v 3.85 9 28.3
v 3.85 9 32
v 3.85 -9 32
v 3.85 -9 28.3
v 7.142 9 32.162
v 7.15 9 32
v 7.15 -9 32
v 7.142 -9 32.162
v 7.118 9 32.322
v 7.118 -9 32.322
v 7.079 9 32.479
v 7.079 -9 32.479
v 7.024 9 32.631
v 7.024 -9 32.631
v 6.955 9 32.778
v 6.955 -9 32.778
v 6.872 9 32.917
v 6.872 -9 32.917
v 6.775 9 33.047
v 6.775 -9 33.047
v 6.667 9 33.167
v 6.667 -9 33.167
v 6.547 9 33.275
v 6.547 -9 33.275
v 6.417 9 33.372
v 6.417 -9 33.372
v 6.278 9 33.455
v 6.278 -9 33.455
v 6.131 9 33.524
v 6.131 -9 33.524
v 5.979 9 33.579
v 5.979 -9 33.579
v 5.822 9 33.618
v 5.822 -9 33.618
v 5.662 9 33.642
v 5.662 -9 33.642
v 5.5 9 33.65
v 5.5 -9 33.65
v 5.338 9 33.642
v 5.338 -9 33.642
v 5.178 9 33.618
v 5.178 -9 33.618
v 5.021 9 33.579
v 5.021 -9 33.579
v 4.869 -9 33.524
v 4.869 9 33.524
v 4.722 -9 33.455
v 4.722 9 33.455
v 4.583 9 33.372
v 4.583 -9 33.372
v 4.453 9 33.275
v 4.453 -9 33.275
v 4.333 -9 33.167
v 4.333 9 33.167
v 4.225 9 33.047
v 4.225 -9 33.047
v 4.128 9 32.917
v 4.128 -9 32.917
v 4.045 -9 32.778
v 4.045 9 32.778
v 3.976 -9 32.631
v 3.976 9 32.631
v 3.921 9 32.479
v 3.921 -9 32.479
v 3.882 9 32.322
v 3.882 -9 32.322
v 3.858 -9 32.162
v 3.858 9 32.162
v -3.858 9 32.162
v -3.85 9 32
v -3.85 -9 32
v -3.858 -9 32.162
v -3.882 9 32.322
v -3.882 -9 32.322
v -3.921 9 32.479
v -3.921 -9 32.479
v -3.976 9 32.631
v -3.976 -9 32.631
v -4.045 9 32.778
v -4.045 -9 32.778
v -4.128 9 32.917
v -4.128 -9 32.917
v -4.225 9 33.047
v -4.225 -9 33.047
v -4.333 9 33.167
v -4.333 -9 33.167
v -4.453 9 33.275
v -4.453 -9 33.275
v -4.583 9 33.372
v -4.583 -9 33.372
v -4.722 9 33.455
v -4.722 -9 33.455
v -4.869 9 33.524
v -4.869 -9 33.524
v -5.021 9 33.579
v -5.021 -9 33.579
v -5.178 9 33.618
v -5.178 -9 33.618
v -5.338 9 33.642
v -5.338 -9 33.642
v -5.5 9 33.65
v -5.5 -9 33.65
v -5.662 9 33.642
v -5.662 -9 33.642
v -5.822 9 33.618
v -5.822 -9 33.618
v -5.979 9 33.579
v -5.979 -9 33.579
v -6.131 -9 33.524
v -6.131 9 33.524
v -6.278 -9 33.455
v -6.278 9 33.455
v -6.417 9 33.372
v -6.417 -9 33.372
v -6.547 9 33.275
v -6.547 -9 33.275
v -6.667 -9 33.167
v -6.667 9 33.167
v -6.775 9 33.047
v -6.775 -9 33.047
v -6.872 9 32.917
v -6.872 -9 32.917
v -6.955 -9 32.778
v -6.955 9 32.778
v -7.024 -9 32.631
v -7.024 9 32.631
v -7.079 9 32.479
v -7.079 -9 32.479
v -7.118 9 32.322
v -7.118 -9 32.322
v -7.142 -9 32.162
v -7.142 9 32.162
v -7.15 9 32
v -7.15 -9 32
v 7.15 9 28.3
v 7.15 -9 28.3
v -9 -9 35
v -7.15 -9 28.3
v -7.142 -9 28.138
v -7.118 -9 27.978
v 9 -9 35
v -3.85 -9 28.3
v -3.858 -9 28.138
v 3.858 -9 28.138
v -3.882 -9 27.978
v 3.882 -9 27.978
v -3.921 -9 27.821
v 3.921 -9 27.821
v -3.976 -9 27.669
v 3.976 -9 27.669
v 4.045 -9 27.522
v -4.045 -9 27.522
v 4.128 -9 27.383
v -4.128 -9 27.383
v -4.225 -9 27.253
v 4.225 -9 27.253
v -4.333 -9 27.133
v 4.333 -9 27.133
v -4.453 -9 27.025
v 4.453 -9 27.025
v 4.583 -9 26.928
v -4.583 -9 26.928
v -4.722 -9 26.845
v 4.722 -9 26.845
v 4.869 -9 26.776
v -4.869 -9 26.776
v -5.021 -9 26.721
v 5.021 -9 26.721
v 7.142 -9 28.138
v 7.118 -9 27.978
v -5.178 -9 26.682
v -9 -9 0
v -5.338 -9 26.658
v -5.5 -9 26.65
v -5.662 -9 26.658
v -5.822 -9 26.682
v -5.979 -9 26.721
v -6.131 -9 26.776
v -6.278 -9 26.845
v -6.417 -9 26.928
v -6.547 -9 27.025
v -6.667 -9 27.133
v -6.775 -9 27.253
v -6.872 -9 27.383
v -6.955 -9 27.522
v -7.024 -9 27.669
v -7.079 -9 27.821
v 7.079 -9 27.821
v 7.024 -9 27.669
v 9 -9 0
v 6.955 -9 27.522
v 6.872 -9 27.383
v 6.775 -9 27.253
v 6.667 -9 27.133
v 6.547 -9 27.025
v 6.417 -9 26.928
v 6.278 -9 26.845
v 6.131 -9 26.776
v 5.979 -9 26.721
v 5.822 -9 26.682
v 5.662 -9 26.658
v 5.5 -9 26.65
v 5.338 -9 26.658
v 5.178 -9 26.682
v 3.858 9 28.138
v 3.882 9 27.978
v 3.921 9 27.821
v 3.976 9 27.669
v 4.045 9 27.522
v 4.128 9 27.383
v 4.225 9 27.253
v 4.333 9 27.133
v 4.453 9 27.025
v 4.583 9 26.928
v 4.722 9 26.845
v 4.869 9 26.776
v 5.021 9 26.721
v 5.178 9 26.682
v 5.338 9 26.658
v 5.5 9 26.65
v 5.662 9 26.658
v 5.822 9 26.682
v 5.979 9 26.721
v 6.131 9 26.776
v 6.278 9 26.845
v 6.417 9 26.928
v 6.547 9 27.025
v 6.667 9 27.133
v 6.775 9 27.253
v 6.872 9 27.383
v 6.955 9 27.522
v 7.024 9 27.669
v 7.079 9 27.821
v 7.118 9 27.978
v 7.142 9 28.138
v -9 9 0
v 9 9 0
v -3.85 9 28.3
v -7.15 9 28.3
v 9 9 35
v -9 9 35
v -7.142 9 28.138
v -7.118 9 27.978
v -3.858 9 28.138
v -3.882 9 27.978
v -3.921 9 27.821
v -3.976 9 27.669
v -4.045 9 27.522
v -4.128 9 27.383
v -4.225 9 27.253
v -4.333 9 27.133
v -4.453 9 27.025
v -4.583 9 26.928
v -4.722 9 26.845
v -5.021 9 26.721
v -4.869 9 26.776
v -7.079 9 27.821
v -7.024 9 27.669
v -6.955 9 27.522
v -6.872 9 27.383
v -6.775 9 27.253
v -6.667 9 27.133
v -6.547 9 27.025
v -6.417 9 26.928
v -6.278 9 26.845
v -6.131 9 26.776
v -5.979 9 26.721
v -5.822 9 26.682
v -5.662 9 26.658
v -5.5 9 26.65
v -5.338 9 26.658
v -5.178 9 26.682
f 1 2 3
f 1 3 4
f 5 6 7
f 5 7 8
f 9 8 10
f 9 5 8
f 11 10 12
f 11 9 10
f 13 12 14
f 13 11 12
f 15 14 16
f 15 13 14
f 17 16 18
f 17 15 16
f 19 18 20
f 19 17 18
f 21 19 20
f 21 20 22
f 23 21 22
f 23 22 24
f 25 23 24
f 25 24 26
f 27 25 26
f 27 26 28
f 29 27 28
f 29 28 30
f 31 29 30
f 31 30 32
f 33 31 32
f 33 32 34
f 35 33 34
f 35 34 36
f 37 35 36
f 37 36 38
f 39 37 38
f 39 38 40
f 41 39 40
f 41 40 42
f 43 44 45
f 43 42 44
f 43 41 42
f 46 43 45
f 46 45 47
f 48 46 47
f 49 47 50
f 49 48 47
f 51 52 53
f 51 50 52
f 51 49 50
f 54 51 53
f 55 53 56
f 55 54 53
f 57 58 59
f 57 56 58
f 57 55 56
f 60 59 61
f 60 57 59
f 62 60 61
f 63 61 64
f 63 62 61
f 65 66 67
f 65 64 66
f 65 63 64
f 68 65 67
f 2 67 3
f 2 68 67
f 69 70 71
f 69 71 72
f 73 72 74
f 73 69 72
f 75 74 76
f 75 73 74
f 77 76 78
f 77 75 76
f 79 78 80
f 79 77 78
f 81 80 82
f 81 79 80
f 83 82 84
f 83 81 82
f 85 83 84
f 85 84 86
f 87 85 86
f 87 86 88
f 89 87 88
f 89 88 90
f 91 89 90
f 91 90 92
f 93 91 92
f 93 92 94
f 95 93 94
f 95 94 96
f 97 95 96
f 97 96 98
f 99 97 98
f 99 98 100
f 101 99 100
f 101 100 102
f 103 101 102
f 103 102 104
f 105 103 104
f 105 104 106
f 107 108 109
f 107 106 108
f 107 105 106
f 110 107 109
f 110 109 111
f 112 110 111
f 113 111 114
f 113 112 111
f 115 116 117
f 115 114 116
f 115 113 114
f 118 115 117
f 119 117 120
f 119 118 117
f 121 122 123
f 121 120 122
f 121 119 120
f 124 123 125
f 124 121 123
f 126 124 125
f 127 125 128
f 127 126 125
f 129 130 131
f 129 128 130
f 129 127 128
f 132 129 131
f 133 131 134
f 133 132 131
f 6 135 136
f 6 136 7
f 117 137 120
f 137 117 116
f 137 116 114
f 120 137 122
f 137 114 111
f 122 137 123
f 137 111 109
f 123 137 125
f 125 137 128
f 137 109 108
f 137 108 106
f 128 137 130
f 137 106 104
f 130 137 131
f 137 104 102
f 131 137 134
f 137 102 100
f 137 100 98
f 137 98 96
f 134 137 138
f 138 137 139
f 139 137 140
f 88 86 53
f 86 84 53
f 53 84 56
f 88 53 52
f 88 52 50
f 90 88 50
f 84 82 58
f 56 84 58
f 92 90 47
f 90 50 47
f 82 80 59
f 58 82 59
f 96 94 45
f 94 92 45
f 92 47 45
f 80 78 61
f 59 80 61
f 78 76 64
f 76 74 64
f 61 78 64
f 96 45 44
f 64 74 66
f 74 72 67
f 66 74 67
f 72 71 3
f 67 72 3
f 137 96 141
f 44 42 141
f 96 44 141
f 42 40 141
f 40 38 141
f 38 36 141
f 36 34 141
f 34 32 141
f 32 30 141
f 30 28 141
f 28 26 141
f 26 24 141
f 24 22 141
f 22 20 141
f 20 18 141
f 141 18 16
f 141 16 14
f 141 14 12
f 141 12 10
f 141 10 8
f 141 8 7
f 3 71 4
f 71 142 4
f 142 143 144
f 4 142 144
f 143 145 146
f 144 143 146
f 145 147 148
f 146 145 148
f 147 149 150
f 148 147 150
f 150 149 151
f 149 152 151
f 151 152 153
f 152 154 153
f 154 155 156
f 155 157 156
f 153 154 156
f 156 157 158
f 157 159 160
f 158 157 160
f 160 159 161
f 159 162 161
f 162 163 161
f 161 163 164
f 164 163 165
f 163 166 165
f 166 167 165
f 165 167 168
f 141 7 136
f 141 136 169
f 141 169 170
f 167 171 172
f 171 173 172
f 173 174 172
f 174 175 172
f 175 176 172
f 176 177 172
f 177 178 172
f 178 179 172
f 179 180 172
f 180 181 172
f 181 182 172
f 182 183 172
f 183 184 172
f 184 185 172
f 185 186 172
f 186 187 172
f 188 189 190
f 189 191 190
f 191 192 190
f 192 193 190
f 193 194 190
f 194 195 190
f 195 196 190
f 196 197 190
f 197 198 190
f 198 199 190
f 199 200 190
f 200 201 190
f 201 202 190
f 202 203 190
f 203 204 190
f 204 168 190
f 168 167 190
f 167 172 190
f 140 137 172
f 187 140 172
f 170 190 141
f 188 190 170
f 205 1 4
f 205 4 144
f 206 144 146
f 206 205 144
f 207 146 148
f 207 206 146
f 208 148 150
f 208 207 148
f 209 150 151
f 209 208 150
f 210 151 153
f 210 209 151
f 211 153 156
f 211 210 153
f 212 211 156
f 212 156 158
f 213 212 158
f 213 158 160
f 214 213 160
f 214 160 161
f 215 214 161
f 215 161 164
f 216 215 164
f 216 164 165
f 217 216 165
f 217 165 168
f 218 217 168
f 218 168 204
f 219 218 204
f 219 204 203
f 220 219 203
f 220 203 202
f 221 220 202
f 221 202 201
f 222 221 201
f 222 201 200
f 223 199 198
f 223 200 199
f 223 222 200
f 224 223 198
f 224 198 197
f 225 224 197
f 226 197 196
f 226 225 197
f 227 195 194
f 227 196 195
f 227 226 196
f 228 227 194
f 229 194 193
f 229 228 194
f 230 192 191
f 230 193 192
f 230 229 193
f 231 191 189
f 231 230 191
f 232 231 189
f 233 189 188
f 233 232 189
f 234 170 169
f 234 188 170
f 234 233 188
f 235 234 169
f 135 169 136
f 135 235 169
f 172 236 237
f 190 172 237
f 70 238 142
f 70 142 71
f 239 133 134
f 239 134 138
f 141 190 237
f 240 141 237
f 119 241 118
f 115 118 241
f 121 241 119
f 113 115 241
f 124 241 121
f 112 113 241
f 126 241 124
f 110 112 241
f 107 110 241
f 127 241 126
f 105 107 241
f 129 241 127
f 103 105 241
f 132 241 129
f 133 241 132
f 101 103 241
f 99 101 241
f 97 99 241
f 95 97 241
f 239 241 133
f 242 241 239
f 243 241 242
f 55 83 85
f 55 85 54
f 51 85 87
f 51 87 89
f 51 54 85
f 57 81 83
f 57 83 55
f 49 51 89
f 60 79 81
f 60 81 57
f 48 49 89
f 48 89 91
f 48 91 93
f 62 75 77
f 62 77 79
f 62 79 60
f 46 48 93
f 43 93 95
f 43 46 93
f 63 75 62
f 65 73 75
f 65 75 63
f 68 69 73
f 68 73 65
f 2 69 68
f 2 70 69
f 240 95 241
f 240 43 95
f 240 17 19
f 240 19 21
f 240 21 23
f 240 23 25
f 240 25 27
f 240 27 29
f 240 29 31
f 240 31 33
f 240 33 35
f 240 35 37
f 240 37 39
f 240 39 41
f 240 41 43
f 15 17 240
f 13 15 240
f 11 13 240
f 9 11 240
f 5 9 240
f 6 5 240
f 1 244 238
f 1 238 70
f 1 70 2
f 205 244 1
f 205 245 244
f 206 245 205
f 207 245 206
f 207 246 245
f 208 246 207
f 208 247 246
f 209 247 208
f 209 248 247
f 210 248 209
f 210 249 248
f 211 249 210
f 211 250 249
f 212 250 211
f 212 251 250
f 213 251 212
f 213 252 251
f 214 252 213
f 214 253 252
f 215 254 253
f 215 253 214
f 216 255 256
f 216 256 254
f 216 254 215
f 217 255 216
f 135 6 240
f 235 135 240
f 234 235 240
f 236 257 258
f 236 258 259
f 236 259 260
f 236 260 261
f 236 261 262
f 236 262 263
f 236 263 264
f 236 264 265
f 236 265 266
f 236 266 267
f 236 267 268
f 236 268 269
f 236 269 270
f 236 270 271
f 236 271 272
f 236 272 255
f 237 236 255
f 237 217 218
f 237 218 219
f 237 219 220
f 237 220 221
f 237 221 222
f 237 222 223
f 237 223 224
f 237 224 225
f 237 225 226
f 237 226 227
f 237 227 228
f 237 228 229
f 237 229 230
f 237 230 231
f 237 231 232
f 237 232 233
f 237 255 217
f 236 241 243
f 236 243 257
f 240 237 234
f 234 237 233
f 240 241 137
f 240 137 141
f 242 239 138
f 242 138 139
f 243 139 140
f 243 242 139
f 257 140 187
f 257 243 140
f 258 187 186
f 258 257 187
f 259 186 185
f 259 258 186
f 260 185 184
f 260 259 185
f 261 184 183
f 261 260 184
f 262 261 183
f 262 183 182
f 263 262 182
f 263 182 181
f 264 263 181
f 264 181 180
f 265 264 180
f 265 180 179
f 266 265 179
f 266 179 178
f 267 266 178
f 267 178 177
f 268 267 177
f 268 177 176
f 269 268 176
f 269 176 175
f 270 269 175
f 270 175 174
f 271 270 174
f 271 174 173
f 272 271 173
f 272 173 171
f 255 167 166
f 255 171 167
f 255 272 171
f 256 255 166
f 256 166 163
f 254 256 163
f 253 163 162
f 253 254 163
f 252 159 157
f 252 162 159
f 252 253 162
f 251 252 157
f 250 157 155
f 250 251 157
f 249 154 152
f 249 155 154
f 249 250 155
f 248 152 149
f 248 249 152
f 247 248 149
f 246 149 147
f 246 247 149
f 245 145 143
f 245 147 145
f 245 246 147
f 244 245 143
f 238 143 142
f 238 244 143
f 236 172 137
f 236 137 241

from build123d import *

# Parameters (mm, degrees)
SKETCH_1_W          = 18
SKETCH_1_H          = 18
EXTRUDE_1_DEPTH     = 35
CUT_EXTRUDE_2_DEPTH = 35


with BuildPart() as part:
    # 草图1 → 拉伸1 (new body)
    with BuildSketch(Plane.XY):
        Rectangle(SKETCH_1_W, SKETCH_1_H)
    extrude(amount=EXTRUDE_1_DEPTH)

    # 草图2 → 拉伸2 (cut)
    with BuildSketch(Plane(origin=(0, 9, 0), x_dir=(1, 0, 0), z_dir=(0, 1, 0))):
        with BuildLine():
            Line((3.85, -32), (3.85, -28.3))
            ThreePointArc((3.85, -28.3), (5.5, -26.65), (7.15, -28.3))
            Line((7.15, -28.3), (7.15, -32))
            ThreePointArc((7.15, -32), (5.5, -33.65), (3.85, -32))
        make_face()
        with BuildLine():
            Line((-7.15, -32), (-7.15, -28.3))
            ThreePointArc((-7.15, -28.3), (-5.5, -26.65), (-3.85, -28.3))
            Line((-3.85, -28.3), (-3.85, -32))
            ThreePointArc((-3.85, -32), (-5.5, -33.65), (-7.15, -32))
        make_face()
    extrude(amount=-CUT_EXTRUDE_2_DEPTH, mode=Mode.SUBTRACT)


solid = part.part
